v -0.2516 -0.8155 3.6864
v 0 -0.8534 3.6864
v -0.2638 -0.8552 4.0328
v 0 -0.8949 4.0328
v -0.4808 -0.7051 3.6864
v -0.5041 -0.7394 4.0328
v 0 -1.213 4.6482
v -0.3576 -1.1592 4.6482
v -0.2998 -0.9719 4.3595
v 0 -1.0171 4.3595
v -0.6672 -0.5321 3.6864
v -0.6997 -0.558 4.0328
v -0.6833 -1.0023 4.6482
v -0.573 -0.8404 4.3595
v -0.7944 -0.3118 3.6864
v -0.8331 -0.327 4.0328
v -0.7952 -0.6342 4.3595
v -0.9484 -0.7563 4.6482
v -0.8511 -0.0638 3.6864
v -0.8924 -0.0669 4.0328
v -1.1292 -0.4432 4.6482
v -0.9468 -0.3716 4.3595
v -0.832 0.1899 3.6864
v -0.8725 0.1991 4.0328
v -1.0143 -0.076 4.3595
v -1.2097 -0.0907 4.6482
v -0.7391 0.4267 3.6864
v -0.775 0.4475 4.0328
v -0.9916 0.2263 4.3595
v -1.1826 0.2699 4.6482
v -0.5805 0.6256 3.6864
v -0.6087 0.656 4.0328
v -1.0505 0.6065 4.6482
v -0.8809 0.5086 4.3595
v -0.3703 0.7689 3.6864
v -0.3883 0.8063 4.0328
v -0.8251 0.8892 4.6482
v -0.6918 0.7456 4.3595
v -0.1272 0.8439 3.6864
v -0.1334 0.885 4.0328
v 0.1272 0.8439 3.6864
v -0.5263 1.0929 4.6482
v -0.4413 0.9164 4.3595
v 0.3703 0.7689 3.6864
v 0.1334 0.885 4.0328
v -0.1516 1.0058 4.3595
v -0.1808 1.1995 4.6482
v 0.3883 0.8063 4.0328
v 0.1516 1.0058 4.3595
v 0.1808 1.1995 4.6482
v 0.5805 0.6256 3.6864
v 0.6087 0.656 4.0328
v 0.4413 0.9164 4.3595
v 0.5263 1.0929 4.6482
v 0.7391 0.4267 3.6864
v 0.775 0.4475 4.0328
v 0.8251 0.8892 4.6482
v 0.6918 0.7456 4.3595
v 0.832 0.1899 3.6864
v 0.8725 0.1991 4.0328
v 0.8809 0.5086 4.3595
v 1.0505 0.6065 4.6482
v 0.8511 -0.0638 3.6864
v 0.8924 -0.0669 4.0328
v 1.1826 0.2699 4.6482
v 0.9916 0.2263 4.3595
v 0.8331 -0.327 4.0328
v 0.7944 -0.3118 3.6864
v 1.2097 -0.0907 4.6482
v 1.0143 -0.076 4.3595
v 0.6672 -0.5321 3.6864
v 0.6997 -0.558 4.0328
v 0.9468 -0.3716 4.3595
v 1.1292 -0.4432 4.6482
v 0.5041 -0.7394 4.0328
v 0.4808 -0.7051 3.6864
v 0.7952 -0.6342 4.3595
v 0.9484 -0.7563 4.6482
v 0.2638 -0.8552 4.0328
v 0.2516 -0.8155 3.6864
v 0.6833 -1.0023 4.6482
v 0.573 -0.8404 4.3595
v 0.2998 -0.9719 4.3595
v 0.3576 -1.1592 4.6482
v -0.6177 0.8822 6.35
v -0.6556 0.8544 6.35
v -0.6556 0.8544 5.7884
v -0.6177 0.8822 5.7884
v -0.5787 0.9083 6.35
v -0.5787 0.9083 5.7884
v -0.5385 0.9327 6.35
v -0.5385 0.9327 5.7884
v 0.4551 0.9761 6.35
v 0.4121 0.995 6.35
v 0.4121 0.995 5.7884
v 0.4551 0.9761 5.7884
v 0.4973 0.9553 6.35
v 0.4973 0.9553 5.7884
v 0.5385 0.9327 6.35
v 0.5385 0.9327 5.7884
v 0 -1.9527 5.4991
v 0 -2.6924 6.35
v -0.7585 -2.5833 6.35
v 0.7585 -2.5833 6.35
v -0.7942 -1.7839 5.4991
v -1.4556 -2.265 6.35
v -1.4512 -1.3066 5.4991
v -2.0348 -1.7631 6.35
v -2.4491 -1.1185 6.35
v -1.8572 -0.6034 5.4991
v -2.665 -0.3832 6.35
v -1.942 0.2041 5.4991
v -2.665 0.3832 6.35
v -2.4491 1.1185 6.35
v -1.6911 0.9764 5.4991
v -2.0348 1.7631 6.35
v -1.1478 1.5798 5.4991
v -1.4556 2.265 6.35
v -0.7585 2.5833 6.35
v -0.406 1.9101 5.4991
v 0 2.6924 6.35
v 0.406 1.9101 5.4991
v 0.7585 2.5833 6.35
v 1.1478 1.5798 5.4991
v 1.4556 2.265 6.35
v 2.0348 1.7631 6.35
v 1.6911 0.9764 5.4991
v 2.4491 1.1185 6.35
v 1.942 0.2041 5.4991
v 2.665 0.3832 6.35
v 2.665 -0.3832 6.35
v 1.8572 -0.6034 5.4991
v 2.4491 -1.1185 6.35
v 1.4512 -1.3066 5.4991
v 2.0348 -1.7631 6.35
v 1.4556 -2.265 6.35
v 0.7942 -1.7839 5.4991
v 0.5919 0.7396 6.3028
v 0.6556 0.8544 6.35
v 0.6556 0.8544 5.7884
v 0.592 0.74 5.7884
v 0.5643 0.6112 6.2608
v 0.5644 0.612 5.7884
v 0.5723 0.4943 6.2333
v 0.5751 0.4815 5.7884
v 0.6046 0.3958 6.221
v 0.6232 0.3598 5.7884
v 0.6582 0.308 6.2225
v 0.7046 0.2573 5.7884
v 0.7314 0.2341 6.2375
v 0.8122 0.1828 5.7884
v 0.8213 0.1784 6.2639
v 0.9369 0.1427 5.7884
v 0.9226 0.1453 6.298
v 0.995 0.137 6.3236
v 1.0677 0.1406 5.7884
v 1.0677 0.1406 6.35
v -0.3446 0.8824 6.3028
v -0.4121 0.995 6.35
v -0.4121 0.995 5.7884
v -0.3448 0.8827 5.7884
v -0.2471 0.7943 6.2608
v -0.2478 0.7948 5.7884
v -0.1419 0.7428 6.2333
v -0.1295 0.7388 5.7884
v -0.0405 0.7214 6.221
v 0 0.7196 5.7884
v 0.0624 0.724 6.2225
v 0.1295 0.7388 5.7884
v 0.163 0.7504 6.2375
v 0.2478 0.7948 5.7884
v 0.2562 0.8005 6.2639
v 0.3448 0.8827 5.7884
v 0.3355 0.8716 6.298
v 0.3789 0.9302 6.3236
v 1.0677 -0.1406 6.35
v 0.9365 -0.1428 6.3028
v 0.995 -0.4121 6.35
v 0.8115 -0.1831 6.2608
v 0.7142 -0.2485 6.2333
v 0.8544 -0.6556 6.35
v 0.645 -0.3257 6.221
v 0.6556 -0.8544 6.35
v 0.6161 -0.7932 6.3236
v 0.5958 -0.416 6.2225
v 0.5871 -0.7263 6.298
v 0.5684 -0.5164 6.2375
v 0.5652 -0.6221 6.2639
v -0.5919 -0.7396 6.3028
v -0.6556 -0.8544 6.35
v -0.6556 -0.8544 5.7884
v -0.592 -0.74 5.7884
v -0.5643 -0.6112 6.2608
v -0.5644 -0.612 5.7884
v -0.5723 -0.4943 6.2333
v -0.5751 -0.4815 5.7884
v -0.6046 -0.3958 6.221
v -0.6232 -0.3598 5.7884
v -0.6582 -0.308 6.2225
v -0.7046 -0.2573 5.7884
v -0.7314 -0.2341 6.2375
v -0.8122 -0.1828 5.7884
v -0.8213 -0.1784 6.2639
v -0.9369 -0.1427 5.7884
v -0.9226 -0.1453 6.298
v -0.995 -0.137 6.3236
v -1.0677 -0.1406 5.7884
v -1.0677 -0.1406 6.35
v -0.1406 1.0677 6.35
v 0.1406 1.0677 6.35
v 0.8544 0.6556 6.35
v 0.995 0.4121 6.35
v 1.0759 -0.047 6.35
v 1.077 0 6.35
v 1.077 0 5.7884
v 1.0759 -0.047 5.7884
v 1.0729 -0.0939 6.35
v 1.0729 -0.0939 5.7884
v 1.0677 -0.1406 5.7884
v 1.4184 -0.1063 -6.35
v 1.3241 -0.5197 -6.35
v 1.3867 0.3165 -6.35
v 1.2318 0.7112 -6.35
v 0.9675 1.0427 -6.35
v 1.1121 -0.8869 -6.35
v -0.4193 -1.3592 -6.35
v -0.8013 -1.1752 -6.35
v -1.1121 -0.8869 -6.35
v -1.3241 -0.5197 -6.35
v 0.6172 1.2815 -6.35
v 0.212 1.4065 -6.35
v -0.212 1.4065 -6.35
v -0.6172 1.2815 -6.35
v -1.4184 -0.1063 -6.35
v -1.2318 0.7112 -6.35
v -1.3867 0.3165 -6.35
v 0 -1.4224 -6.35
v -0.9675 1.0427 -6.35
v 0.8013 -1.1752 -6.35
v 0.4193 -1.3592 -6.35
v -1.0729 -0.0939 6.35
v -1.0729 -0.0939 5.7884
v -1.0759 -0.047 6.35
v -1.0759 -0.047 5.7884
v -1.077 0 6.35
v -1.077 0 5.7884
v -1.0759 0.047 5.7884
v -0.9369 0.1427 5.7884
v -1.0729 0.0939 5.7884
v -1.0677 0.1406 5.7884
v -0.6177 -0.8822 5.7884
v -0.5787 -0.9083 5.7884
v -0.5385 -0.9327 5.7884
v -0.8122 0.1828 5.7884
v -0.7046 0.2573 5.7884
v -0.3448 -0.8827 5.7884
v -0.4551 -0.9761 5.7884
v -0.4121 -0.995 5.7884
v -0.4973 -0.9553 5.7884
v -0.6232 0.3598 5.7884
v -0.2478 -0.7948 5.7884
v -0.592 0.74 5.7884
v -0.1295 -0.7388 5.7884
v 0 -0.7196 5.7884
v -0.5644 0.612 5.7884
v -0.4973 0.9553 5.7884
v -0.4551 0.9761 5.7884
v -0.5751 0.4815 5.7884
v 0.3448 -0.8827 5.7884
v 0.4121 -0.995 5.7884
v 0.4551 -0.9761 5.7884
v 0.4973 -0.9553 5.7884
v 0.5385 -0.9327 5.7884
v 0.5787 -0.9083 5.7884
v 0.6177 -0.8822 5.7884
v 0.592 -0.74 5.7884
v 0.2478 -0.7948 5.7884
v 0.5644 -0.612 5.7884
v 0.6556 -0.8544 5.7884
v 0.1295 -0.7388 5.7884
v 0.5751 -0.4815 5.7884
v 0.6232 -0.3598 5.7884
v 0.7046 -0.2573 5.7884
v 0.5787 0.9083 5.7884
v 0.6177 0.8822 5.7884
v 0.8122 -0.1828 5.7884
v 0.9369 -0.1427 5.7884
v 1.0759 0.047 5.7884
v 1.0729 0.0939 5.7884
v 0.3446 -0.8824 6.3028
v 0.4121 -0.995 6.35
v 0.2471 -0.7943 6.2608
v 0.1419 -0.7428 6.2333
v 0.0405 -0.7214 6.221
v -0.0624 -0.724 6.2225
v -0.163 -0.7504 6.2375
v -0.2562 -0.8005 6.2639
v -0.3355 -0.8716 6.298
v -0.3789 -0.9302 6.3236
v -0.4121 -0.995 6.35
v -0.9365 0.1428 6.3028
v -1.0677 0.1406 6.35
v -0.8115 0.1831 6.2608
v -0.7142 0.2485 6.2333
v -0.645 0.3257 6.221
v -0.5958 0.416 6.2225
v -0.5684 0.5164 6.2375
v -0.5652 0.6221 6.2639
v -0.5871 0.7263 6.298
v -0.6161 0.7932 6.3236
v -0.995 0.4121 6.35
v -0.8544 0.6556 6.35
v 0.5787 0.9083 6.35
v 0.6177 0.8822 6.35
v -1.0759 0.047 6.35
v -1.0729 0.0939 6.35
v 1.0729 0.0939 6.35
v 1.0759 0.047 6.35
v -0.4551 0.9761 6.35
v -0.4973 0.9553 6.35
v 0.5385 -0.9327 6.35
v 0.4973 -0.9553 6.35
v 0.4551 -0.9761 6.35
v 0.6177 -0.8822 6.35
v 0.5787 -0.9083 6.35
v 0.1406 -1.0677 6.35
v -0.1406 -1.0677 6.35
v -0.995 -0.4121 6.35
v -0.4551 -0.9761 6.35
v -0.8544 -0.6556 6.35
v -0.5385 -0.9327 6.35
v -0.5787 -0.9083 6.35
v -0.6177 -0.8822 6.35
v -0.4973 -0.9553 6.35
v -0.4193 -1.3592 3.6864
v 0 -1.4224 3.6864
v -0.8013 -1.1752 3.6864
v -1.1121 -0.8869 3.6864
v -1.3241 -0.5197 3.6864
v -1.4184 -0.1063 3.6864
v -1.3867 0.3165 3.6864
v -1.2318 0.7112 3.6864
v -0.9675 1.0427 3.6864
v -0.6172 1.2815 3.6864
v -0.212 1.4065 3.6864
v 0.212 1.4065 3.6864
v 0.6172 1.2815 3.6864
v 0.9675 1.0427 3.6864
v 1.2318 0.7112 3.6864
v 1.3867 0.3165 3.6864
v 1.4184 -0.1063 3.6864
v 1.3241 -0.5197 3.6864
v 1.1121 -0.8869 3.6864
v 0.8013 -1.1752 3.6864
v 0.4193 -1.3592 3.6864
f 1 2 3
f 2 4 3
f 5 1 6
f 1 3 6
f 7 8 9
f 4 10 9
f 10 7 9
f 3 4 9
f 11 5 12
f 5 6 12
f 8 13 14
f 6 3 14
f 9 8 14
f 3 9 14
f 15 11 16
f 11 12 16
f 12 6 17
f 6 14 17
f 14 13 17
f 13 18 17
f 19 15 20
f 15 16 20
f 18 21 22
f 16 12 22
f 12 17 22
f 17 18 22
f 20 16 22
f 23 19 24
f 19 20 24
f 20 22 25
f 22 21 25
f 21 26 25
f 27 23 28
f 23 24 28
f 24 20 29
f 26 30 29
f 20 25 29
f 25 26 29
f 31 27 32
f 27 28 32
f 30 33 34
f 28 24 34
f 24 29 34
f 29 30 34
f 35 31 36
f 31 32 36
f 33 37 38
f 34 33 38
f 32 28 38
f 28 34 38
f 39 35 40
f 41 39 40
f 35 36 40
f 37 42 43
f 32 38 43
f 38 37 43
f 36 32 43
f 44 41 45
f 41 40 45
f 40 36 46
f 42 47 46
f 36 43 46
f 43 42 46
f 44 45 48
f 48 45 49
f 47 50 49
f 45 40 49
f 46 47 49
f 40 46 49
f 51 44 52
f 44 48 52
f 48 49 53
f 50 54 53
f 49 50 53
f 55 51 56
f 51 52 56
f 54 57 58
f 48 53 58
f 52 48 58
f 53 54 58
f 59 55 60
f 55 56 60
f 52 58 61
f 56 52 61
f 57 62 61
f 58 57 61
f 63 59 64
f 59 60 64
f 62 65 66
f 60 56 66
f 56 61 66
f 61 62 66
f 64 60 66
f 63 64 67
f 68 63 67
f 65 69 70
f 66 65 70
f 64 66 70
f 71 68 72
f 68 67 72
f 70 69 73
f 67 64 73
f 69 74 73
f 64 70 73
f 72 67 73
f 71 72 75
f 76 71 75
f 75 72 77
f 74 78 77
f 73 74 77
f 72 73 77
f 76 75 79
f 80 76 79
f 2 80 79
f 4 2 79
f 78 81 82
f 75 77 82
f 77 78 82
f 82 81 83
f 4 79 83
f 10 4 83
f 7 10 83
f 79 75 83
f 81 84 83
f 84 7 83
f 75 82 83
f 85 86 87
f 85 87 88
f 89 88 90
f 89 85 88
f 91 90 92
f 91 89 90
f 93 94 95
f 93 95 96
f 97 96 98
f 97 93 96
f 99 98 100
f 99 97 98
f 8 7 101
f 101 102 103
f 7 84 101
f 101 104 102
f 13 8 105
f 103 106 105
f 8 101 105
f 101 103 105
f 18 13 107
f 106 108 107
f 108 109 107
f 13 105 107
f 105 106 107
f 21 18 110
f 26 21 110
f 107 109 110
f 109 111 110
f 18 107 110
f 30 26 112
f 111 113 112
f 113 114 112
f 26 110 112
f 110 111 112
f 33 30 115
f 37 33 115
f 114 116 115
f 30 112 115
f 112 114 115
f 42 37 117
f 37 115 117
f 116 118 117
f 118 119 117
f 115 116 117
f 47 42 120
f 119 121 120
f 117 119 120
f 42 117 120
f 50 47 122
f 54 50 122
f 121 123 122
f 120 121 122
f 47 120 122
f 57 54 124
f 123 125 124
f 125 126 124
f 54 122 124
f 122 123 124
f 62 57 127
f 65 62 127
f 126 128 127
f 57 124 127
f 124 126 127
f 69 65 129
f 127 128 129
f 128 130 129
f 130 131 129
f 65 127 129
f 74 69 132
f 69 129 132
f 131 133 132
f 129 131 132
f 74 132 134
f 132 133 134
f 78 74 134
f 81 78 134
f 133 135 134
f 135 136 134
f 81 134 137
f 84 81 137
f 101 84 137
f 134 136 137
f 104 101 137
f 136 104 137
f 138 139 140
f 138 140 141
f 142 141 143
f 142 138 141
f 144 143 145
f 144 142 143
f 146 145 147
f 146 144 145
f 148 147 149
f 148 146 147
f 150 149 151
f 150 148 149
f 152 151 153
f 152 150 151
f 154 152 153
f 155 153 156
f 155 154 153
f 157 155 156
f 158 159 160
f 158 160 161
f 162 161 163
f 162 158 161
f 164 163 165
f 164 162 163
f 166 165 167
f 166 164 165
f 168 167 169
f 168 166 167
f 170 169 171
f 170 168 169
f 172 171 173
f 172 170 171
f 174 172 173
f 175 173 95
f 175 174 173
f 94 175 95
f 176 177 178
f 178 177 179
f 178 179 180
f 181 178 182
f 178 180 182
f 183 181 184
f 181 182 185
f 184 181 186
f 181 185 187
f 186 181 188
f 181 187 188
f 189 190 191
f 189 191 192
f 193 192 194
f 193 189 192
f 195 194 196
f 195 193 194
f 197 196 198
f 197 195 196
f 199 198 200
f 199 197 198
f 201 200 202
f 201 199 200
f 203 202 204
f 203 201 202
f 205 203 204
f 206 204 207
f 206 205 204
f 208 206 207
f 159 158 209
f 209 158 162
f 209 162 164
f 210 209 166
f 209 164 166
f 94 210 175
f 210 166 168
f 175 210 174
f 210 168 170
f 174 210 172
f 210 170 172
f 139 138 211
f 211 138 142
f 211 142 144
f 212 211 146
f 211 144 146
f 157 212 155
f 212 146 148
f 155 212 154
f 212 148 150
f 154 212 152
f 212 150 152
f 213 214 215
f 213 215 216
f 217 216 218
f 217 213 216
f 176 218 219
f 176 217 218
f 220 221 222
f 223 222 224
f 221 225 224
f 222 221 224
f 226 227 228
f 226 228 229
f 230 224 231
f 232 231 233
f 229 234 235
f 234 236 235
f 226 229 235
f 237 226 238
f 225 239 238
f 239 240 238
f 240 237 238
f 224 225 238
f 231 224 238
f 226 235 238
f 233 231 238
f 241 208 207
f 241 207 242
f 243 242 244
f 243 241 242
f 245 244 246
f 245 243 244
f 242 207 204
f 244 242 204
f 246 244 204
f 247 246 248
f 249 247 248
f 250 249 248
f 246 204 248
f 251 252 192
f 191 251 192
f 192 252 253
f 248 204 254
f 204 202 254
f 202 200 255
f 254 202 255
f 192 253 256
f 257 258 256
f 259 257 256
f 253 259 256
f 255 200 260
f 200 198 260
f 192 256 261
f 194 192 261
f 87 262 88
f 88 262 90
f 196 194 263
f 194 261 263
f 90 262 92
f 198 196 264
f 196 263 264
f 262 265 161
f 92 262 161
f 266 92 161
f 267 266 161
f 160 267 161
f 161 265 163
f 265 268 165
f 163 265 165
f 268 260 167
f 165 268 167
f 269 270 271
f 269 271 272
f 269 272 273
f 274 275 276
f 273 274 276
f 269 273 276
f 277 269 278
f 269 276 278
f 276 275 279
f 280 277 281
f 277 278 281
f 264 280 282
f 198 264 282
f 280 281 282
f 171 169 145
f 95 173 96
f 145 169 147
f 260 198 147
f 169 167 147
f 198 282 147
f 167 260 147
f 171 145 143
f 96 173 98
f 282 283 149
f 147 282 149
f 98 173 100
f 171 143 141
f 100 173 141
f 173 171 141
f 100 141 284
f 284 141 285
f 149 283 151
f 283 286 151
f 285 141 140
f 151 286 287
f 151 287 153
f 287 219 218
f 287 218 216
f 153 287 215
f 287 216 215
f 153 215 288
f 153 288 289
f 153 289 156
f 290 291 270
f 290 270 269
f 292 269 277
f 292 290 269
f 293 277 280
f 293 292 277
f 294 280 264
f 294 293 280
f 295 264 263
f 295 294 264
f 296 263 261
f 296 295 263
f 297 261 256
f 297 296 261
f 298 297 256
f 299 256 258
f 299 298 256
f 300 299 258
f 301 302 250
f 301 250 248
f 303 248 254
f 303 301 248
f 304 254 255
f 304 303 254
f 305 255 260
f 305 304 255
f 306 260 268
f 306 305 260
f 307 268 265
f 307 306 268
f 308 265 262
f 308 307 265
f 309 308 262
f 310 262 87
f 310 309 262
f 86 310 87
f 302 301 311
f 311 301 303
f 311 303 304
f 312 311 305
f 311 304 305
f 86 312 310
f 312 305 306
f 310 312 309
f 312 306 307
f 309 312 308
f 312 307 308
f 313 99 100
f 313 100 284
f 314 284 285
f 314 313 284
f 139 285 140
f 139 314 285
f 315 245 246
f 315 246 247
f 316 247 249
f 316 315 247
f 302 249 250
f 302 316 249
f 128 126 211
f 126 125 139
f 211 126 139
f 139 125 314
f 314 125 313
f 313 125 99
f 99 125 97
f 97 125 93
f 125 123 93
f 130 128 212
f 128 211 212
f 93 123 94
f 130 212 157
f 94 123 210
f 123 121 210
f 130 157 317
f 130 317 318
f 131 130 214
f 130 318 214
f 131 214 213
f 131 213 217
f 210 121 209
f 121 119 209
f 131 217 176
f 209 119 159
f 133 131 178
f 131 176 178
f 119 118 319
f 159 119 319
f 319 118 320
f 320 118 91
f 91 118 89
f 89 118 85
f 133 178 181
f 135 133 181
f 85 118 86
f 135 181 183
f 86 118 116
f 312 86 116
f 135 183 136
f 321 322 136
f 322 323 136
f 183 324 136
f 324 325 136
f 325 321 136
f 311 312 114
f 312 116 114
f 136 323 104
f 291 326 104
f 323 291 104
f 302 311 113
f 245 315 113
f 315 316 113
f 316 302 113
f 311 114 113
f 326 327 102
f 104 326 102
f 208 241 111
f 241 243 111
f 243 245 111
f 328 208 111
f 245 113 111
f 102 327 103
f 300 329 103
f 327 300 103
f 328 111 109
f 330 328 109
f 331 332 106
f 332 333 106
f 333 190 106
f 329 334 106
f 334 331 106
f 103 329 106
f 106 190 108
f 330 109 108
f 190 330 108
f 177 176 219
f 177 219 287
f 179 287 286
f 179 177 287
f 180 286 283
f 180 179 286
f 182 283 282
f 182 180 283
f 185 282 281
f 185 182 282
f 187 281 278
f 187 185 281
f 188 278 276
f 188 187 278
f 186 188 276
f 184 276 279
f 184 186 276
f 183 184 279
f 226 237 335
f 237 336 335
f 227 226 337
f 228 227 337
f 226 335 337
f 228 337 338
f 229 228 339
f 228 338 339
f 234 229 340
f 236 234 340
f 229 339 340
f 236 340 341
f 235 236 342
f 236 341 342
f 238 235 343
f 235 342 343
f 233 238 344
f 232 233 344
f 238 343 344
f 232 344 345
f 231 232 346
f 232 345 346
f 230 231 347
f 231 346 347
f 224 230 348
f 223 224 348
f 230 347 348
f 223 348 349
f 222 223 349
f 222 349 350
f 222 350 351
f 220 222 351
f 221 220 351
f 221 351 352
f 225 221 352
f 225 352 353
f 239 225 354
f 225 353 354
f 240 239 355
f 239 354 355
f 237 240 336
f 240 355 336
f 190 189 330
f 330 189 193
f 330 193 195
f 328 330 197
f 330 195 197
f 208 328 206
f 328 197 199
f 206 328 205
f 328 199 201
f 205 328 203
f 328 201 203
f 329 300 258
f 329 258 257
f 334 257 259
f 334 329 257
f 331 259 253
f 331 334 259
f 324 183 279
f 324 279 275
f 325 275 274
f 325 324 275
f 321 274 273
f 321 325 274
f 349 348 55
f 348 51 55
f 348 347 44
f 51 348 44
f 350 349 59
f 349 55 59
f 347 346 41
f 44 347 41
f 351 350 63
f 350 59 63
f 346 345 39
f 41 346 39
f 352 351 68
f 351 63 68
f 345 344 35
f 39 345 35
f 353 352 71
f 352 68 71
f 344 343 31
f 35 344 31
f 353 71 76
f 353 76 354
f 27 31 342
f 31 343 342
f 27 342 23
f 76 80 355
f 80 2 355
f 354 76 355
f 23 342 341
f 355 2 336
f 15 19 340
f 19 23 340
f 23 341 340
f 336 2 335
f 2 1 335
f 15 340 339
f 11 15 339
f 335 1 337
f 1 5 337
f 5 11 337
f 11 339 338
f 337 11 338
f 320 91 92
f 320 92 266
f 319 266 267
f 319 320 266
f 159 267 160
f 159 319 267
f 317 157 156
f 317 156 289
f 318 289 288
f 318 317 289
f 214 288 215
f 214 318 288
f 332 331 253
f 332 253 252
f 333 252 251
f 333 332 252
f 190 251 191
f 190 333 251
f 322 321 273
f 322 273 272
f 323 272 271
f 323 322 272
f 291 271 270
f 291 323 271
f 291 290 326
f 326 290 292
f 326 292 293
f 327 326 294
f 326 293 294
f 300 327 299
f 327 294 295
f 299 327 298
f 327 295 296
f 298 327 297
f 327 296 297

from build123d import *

# Parameters (mm, degrees)
CUT_EXTRUDE14_DEPTH = 0.561594
CIRPATTERN1_COUNT   = 6


with BuildPart() as part:
    # Sketch3 → Revolve1 (revolve)
    with BuildSketch(Plane(origin=(0, 0, 0), x_dir=(0, 0, -1), z_dir=(1, 0, 0)), mode=Mode.PRIVATE) as revolve1_sk:
        with BuildLine():
            Line((-3.68638517, 1.4224), (-3.68638517, 0.85344))
            ThreePointArc((-3.68638517, 0.85344), (-4.199806429, 0.946281688), (-4.6482, 1.21304783))
            Line((-4.6482, 1.21304783), (-6.35, 2.6924))
            Line((-6.35, 2.6924), (-6.35, 0))
            Line((-6.35, 0), (6.35, 0))
            Line((6.35, 0), (6.35, 1.4224))
            Line((6.35, 1.4224), (-3.68638517, 1.4224))
        make_face()
    revolve(revolve1_sk.sketch.rotate(Axis((0, 0, 6.35), (0, 0, -1)), 180), axis=Axis((0, 0, 6.35), (0, 0, -1)))

    # Sketch21 → Cut-Extrude14 (cut)
    with BuildSketch(Plane.XY.offset(6.35)):
        with BuildLine():
            Line((0, 0), (-0.53848, 0.932674719))
            ThreePointArc((-0.53848, 0.932674719), (-0.476327228, 0.965896068), (-0.412134749, 0.994981301))
            ThreePointArc((-0.412134749, 0.994981301), (0, 0.719601666), (0.412134749, 0.994981301))
            ThreePointArc((0.412134749, 0.994981301), (0.476327228, 0.965896068), (0.53848, 0.932674719))
            Line((0.53848, 0.932674719), (0, 0))
        make_face()
    cut_extrude14 = extrude(amount=-CUT_EXTRUDE14_DEPTH, mode=Mode.SUBTRACT)

    # CirPattern1: Cut-Extrude14 ×6 about axis
    cirpattern1_axis = Axis((0, 0, 0), (0, 0, 1))
    for i in range(1, CIRPATTERN1_COUNT):
        add(cut_extrude14.rotate(cirpattern1_axis, i * 360 / CIRPATTERN1_COUNT), mode=Mode.SUBTRACT)

    # Cut-Extrude15 cone 1 section (through the dimple's axis) → Cut-Extrude15 (revolve, cut)
    with BuildSketch(Plane(origin=(0, 0, 6.35), x_dir=(0, -1, 0), z_dir=(1, 0, 0))):
        Polygon((0, 0), (1.07696, 0), (0, 0.391981383), align=None)
    revolve(axis=Axis((0, 0, 6.35), (0, 0, -1)), mode=Mode.SUBTRACT)


solid = part.part
